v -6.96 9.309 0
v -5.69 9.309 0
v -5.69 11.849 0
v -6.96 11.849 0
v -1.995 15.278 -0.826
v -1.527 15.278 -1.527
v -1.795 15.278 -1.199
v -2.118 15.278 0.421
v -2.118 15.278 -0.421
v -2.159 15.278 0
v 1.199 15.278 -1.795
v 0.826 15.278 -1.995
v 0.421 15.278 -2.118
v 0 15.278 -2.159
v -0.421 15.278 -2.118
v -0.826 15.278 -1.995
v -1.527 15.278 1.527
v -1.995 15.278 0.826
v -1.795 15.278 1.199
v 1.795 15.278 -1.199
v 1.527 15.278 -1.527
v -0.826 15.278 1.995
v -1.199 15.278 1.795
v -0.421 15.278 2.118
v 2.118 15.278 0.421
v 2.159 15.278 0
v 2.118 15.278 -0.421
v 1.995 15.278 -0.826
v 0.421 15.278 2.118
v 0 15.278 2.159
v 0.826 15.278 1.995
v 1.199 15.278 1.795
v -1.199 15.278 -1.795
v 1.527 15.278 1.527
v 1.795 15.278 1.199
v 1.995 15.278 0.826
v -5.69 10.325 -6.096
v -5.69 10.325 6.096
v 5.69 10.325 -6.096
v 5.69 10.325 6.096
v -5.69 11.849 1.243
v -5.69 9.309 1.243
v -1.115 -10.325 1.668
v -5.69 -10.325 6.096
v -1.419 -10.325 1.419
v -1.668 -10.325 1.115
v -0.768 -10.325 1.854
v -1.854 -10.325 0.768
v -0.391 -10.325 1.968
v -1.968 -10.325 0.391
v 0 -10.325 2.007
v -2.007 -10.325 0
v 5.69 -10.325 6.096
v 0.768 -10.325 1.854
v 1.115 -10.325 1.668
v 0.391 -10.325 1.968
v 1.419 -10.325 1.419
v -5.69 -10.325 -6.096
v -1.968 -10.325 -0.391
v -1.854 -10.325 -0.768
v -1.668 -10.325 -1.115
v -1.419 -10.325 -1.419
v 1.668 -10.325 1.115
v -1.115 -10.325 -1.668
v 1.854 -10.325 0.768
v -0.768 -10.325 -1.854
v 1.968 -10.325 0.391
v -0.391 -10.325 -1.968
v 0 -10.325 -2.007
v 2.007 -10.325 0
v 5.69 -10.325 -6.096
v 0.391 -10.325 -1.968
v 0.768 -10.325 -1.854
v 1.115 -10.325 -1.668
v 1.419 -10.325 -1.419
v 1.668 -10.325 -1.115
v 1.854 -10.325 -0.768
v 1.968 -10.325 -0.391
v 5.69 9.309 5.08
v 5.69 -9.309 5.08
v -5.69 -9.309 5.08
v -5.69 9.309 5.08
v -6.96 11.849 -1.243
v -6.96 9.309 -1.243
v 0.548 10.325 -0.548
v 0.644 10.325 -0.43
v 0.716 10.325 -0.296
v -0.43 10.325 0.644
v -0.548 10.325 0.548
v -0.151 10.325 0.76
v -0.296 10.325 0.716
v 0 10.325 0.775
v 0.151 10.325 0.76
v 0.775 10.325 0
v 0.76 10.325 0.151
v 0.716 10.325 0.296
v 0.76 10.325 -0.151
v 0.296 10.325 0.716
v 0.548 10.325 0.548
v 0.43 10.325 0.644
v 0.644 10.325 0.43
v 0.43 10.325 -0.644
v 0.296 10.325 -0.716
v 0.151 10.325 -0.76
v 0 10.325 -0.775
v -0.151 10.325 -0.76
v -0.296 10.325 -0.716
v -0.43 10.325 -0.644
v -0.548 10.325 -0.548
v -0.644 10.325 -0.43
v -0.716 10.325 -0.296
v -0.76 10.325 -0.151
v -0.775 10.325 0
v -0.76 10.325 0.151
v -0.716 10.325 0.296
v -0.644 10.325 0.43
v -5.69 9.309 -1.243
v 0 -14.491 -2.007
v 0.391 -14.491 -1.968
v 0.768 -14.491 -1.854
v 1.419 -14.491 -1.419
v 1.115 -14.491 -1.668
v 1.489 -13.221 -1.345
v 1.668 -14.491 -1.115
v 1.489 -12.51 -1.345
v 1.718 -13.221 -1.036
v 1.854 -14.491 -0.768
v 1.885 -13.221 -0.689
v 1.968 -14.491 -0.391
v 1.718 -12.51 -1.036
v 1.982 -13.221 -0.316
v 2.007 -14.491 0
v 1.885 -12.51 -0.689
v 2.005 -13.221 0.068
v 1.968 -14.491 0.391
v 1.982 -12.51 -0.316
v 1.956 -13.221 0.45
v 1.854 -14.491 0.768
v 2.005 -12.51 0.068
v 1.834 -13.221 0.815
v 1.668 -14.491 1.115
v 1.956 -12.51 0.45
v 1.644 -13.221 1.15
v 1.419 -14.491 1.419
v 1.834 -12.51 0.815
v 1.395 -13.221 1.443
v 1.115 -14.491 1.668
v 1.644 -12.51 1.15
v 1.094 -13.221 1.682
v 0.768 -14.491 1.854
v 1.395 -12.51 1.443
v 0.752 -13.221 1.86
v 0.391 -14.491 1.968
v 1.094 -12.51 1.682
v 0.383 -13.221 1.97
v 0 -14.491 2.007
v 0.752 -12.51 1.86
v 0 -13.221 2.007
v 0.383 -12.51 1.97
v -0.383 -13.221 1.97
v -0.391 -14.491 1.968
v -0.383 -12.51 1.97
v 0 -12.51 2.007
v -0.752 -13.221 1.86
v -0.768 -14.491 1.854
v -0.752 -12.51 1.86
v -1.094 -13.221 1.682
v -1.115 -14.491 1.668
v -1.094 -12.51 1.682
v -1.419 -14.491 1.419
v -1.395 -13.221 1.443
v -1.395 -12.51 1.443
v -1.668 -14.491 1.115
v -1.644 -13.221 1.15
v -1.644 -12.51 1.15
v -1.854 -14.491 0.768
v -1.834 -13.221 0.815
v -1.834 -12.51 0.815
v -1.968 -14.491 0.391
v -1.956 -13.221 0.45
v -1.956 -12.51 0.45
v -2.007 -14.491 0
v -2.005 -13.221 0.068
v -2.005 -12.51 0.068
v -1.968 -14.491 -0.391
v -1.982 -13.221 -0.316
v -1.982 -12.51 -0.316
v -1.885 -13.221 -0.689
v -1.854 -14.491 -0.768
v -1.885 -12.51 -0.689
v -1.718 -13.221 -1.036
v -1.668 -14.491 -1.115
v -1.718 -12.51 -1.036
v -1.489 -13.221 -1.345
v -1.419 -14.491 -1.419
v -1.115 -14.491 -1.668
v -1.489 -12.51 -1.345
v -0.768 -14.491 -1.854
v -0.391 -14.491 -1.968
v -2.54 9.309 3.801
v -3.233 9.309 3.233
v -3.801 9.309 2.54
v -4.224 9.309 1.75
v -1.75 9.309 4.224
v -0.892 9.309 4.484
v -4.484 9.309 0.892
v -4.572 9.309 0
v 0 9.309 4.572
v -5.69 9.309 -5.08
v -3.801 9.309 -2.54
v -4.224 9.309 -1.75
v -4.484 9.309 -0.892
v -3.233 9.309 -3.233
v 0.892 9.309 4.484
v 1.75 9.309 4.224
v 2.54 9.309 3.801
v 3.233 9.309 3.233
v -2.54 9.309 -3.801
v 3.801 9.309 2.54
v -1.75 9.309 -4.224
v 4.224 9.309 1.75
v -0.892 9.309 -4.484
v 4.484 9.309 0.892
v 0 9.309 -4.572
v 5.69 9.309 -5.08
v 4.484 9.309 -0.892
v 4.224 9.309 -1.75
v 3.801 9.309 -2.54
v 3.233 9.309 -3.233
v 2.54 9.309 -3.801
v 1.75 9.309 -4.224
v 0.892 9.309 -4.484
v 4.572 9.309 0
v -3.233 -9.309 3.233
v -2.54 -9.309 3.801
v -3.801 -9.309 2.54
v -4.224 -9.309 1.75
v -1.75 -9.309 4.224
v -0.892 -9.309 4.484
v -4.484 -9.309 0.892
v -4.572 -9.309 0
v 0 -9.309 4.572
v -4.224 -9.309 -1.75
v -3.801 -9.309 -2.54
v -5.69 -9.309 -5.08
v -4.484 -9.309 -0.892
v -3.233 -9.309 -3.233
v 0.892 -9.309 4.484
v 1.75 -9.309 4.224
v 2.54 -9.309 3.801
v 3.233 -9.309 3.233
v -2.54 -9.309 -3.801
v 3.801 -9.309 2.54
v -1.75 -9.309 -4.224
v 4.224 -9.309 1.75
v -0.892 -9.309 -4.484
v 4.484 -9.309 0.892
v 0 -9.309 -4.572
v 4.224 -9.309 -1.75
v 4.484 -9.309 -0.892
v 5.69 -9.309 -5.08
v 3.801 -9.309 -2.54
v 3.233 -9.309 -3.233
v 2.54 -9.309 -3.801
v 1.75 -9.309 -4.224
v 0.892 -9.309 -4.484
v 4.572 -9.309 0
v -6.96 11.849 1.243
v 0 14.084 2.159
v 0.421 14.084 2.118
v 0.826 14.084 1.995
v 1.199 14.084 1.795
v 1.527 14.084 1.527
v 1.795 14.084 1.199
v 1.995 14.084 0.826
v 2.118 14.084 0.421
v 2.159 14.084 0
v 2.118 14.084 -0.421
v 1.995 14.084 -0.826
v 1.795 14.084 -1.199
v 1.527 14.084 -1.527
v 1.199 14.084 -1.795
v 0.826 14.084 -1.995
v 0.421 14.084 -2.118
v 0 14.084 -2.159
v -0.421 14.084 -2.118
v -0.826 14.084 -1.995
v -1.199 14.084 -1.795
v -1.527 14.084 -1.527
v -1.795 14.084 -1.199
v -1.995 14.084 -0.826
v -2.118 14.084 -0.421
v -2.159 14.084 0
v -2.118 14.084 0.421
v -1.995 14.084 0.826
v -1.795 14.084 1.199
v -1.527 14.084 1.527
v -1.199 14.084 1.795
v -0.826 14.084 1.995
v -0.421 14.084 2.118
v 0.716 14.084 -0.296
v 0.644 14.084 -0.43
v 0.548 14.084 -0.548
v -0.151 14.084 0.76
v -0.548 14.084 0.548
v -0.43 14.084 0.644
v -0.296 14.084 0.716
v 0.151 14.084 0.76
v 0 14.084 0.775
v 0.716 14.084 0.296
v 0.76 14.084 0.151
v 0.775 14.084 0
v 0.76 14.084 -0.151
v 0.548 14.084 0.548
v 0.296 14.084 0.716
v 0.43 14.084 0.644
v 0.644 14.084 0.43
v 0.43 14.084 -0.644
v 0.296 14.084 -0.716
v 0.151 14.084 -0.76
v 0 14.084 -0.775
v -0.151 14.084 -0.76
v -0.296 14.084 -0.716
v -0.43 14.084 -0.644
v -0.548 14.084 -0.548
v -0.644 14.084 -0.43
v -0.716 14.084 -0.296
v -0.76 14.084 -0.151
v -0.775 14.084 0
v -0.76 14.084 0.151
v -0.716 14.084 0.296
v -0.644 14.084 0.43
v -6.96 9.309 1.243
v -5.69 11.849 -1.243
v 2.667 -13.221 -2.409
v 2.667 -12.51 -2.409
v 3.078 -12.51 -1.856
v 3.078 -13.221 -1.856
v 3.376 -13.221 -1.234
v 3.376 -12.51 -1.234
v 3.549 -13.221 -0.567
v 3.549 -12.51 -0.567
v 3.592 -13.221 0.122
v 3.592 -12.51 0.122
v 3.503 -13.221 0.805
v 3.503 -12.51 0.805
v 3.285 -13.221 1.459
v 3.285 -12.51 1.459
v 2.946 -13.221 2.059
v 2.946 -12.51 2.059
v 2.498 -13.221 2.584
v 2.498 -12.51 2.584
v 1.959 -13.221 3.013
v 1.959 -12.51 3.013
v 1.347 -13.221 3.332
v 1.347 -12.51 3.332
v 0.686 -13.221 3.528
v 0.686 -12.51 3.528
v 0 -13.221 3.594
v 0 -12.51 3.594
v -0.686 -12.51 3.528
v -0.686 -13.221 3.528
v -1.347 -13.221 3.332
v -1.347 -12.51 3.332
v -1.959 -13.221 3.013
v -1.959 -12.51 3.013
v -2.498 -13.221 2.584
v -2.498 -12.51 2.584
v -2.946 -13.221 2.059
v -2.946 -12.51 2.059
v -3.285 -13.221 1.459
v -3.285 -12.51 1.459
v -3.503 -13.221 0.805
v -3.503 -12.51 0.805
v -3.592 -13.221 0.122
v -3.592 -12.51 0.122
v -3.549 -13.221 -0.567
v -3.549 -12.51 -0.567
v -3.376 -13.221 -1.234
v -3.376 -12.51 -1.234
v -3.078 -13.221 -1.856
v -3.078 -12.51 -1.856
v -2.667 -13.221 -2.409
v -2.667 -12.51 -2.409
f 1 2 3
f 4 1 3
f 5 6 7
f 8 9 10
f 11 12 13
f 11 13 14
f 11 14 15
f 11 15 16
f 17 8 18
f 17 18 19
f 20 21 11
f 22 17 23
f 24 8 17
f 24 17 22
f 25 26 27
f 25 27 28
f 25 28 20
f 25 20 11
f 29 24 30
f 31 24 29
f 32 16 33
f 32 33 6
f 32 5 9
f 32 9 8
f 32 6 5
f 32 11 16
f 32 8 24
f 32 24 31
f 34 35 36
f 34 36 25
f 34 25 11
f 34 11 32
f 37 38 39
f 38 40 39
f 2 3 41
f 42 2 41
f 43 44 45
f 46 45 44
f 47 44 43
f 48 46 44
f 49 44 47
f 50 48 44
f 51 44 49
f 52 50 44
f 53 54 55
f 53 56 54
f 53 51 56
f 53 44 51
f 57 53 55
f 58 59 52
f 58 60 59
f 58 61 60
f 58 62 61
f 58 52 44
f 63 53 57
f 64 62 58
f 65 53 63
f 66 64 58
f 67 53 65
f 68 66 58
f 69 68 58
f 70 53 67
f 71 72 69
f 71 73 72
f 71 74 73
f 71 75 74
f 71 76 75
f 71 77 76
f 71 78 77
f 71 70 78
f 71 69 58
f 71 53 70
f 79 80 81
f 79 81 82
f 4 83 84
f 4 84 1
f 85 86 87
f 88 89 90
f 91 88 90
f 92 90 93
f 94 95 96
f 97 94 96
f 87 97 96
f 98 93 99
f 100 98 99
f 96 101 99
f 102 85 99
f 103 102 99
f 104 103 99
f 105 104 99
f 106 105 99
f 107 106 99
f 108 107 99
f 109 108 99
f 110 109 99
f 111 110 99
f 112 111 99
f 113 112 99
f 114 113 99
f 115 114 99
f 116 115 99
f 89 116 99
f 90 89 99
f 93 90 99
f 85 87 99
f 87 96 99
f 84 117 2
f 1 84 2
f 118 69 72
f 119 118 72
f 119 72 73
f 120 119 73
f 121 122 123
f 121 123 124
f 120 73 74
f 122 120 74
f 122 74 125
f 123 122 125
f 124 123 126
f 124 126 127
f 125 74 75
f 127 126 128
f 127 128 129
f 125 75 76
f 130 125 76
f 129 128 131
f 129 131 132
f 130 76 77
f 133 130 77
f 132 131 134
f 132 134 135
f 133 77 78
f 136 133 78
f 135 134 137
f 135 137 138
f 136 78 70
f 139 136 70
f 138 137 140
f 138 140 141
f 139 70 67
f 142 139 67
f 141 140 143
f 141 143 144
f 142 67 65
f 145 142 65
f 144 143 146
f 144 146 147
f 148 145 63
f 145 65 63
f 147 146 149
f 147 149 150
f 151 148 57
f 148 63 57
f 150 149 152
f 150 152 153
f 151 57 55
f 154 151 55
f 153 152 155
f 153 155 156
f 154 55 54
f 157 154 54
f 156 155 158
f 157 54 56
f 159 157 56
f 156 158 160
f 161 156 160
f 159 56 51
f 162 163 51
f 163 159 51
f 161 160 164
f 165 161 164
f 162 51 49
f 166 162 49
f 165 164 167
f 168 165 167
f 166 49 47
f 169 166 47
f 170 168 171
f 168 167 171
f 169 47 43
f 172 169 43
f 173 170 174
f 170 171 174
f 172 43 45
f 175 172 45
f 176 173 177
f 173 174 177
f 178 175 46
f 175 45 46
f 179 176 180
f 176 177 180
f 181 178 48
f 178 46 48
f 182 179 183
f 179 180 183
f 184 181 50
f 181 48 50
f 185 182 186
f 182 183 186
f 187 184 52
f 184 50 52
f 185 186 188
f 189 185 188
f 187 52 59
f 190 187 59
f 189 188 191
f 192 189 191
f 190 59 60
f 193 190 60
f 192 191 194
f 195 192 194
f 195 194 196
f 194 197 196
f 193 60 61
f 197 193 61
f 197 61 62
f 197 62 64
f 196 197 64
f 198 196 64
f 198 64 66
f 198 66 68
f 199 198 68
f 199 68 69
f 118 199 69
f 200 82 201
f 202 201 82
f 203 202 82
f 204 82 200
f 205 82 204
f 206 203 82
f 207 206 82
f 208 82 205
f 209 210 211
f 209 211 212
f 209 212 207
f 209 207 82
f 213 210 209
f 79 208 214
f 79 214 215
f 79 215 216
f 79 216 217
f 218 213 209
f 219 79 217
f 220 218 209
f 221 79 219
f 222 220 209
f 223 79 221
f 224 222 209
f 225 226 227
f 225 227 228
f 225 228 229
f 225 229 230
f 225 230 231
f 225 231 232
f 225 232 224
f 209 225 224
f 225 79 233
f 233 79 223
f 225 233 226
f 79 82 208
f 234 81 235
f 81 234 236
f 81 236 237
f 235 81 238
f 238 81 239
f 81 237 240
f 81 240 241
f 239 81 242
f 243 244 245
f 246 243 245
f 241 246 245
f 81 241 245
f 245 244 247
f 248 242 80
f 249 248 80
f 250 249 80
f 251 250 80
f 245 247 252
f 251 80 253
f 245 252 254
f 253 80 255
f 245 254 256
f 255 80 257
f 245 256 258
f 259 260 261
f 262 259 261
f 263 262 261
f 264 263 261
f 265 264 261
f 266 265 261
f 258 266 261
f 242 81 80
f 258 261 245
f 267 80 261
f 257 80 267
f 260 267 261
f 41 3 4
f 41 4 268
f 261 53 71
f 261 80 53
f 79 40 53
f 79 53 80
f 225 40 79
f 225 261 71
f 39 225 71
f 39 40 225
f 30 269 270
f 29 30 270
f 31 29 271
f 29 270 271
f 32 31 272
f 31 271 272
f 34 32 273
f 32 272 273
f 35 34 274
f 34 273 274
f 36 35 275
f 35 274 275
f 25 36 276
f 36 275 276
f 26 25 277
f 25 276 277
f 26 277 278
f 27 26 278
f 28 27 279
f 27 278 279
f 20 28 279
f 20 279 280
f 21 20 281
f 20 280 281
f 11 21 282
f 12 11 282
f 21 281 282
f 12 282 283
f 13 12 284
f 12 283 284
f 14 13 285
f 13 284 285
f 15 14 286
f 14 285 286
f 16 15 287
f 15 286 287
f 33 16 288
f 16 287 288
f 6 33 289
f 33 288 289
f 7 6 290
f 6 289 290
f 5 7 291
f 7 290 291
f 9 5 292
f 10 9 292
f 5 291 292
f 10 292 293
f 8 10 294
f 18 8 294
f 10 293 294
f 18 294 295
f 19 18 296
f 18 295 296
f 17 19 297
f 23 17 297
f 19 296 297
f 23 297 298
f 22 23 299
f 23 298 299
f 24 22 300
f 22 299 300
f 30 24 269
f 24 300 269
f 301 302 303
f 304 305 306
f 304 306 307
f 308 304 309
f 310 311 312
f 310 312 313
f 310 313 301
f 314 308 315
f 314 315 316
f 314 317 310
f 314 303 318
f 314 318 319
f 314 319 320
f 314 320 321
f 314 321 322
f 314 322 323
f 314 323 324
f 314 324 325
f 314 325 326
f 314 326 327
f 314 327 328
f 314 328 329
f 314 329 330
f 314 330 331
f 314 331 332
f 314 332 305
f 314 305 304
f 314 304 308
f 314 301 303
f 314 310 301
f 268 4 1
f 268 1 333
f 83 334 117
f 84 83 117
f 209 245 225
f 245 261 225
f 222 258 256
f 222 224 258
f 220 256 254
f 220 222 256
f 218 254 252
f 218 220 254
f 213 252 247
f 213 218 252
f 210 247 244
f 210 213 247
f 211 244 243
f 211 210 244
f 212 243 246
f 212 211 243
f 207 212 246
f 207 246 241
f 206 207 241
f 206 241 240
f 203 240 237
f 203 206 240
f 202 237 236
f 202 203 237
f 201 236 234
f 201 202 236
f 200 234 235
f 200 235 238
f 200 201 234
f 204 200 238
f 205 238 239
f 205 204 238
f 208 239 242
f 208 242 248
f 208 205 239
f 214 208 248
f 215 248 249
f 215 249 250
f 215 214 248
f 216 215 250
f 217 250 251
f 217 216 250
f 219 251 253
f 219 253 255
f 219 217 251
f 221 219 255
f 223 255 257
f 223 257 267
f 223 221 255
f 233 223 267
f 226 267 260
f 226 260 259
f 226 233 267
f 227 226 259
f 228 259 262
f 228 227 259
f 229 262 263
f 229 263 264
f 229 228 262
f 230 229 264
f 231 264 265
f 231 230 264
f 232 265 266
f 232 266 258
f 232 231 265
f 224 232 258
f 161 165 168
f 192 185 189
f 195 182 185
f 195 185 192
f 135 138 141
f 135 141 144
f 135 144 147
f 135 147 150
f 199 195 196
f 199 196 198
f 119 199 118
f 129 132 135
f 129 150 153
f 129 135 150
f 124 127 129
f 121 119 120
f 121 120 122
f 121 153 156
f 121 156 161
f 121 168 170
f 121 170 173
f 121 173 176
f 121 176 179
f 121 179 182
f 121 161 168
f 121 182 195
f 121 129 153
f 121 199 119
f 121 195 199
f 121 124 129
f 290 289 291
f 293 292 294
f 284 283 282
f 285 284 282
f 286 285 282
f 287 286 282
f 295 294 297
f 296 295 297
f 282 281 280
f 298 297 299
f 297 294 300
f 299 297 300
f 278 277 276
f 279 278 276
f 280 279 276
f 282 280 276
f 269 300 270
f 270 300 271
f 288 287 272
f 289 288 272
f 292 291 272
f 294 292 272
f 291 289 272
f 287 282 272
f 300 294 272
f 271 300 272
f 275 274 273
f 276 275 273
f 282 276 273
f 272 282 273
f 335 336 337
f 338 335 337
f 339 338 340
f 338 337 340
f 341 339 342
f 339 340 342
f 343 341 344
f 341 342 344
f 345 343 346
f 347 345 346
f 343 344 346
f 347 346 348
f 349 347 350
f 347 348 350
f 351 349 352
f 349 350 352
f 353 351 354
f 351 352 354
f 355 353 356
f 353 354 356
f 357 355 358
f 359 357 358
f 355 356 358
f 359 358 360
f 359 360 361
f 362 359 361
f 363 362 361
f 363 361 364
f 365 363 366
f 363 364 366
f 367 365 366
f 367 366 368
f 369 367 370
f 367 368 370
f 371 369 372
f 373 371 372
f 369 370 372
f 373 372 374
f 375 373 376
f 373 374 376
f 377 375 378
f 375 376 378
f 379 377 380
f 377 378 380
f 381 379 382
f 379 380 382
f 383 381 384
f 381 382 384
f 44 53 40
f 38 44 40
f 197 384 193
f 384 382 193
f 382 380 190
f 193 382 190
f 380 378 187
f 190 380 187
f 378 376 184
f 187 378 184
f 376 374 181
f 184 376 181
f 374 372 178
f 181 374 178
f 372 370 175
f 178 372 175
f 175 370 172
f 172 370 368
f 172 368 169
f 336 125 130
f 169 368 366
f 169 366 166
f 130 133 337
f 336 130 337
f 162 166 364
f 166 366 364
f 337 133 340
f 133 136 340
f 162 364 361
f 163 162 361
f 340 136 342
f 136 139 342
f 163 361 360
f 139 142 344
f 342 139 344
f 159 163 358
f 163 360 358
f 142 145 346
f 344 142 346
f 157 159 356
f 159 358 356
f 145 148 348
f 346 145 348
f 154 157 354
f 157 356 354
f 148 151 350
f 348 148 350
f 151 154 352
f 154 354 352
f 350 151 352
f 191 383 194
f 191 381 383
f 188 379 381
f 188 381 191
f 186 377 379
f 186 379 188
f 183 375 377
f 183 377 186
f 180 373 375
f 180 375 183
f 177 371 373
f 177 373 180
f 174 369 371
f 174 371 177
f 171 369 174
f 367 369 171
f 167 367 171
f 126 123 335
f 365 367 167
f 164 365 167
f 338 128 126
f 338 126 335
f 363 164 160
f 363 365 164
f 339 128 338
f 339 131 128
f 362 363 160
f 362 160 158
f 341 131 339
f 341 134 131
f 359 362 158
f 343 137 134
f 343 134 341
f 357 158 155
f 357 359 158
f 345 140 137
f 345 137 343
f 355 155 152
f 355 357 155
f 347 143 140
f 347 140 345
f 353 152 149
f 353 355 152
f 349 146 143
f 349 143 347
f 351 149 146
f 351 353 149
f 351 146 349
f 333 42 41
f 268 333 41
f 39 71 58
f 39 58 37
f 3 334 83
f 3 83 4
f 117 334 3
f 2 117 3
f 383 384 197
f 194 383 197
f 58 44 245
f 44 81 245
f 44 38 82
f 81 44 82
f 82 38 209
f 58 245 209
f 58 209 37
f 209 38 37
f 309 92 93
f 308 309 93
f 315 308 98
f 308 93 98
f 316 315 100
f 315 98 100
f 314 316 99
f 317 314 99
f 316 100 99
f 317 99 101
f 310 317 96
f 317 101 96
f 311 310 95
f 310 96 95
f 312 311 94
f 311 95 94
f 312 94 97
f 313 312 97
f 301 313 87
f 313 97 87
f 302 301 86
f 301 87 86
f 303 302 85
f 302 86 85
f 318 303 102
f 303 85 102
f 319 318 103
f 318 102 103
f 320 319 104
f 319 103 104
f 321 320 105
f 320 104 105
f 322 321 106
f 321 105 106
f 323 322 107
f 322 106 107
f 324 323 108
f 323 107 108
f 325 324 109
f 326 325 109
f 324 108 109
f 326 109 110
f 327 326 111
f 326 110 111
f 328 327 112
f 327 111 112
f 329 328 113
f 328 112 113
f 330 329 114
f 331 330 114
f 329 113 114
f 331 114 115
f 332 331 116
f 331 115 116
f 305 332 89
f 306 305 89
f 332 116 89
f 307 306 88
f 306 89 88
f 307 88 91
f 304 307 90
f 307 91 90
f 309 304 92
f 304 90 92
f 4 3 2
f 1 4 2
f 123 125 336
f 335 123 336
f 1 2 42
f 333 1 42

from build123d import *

# Parameters (mm, degrees)
SKETCH3_W            = 12.192
SKETCH3_H            = 20.6502
SKETCH3_W_2          = 10.16
SKETCH3_H_2          = 18.6182
BOSS_EXTRUDE3_DEPTH  = 5.6896
SKETCH2_R            = 4.572
BOSS_EXTRUDE2_DEPTH  = 9.398
SKETCH4_R            = 0.7747
BOSS_EXTRUDE4_DEPTH  = 3.7592
SKETCH5_R            = 2.0066
BOSS_EXTRUDE5_DEPTH  = 4.1656
BOSS_EXTRUDE11_DEPTH = 0.7112
SKETCH7_W            = 1.242870129
SKETCH7_H            = 2.54
BOSS_EXTRUDE12_DEPTH = 1.27
SKETCH7_3_W          = 1.242870129
SKETCH7_3_H          = 2.54
BOSS_EXTRUDE13_DEPTH = 1.27
SKETCH8_R            = 2.159
BOSS_EXTRUDE14_DEPTH = 1.1938


with BuildPart() as part:
    # Sketch3 → Boss-Extrude3 (new, symmetric)
    with BuildSketch(Plane(origin=(0, 0, 0), x_dir=(0, 0, -1), z_dir=(1, 0, 0))):
        Rectangle(SKETCH3_W, SKETCH3_H)
        Rectangle(SKETCH3_W_2, SKETCH3_H_2, mode=Mode.SUBTRACT)
    extrude(amount=BOSS_EXTRUDE3_DEPTH, both=True)

    # Sketch2 → Boss-Extrude2 (add, symmetric)
    with BuildSketch(Plane(origin=(0, 0, 0), x_dir=(1, 0, 0), z_dir=(0, 1, 0))):
        Circle(SKETCH2_R)
    extrude(amount=BOSS_EXTRUDE2_DEPTH, both=True)

    # Sketch5 → Boss-Extrude5 (add)
    with BuildSketch(Plane.XZ.offset(10.3251)):
        Circle(SKETCH5_R)
    extrude(amount=BOSS_EXTRUDE5_DEPTH)

    # Sketch6 → Boss-Extrude11 (add)
    with BuildSketch(Plane.XZ.offset(12.5095)):
        with BuildLine():
            Line((-2.667, -2.409287407), (-1.488996466, -1.345114524))
            ThreePointArc((-1.488996466, -1.345114524), (0, 2.0066), (1.488996466, -1.345114524))
            Line((1.488996466, -1.345114524), (2.667, -2.409287407))
            ThreePointArc((2.667, -2.409287407), (0, 3.5941), (-2.667, -2.409287407))
        make_face()
    extrude(amount=BOSS_EXTRUDE11_DEPTH)


with BuildPart() as body_2:
    # Sketch4 → Boss-Extrude4 (new body)
    with BuildSketch(Plane(origin=(0, 10.3251, 0), x_dir=(1, 0, 0), z_dir=(0, 1, 0))):
        Circle(SKETCH4_R)
    extrude(amount=BOSS_EXTRUDE4_DEPTH)


with BuildPart() as body_3:
    # Sketch7 → Boss-Extrude12 (new body)
    with BuildSketch(Plane.ZY.offset(5.6896)):
        with Locations((-0.621435065, 10.5791)):
            Rectangle(SKETCH7_W, SKETCH7_H)
    extrude(amount=BOSS_EXTRUDE12_DEPTH)


with BuildPart() as body_4:
    # Sketch7<3> → Boss-Extrude13 (new body)
    with BuildSketch(Plane.ZY.offset(5.6896)):
        with Locations((0.621435065, 10.5791)):
            Rectangle(SKETCH7_3_W, SKETCH7_3_H)
    extrude(amount=BOSS_EXTRUDE13_DEPTH)


with BuildPart() as body_5:
    # Sketch8 → Boss-Extrude14 (new body)
    with BuildSketch(Plane(origin=(0, 14.0843, 0), x_dir=(1, 0, 0), z_dir=(0, 1, 0))):
        Circle(SKETCH8_R)
    extrude(amount=BOSS_EXTRUDE14_DEPTH)


solid = Compound([part.part, body_2.part, body_3.part, body_4.part, body_5.part])
